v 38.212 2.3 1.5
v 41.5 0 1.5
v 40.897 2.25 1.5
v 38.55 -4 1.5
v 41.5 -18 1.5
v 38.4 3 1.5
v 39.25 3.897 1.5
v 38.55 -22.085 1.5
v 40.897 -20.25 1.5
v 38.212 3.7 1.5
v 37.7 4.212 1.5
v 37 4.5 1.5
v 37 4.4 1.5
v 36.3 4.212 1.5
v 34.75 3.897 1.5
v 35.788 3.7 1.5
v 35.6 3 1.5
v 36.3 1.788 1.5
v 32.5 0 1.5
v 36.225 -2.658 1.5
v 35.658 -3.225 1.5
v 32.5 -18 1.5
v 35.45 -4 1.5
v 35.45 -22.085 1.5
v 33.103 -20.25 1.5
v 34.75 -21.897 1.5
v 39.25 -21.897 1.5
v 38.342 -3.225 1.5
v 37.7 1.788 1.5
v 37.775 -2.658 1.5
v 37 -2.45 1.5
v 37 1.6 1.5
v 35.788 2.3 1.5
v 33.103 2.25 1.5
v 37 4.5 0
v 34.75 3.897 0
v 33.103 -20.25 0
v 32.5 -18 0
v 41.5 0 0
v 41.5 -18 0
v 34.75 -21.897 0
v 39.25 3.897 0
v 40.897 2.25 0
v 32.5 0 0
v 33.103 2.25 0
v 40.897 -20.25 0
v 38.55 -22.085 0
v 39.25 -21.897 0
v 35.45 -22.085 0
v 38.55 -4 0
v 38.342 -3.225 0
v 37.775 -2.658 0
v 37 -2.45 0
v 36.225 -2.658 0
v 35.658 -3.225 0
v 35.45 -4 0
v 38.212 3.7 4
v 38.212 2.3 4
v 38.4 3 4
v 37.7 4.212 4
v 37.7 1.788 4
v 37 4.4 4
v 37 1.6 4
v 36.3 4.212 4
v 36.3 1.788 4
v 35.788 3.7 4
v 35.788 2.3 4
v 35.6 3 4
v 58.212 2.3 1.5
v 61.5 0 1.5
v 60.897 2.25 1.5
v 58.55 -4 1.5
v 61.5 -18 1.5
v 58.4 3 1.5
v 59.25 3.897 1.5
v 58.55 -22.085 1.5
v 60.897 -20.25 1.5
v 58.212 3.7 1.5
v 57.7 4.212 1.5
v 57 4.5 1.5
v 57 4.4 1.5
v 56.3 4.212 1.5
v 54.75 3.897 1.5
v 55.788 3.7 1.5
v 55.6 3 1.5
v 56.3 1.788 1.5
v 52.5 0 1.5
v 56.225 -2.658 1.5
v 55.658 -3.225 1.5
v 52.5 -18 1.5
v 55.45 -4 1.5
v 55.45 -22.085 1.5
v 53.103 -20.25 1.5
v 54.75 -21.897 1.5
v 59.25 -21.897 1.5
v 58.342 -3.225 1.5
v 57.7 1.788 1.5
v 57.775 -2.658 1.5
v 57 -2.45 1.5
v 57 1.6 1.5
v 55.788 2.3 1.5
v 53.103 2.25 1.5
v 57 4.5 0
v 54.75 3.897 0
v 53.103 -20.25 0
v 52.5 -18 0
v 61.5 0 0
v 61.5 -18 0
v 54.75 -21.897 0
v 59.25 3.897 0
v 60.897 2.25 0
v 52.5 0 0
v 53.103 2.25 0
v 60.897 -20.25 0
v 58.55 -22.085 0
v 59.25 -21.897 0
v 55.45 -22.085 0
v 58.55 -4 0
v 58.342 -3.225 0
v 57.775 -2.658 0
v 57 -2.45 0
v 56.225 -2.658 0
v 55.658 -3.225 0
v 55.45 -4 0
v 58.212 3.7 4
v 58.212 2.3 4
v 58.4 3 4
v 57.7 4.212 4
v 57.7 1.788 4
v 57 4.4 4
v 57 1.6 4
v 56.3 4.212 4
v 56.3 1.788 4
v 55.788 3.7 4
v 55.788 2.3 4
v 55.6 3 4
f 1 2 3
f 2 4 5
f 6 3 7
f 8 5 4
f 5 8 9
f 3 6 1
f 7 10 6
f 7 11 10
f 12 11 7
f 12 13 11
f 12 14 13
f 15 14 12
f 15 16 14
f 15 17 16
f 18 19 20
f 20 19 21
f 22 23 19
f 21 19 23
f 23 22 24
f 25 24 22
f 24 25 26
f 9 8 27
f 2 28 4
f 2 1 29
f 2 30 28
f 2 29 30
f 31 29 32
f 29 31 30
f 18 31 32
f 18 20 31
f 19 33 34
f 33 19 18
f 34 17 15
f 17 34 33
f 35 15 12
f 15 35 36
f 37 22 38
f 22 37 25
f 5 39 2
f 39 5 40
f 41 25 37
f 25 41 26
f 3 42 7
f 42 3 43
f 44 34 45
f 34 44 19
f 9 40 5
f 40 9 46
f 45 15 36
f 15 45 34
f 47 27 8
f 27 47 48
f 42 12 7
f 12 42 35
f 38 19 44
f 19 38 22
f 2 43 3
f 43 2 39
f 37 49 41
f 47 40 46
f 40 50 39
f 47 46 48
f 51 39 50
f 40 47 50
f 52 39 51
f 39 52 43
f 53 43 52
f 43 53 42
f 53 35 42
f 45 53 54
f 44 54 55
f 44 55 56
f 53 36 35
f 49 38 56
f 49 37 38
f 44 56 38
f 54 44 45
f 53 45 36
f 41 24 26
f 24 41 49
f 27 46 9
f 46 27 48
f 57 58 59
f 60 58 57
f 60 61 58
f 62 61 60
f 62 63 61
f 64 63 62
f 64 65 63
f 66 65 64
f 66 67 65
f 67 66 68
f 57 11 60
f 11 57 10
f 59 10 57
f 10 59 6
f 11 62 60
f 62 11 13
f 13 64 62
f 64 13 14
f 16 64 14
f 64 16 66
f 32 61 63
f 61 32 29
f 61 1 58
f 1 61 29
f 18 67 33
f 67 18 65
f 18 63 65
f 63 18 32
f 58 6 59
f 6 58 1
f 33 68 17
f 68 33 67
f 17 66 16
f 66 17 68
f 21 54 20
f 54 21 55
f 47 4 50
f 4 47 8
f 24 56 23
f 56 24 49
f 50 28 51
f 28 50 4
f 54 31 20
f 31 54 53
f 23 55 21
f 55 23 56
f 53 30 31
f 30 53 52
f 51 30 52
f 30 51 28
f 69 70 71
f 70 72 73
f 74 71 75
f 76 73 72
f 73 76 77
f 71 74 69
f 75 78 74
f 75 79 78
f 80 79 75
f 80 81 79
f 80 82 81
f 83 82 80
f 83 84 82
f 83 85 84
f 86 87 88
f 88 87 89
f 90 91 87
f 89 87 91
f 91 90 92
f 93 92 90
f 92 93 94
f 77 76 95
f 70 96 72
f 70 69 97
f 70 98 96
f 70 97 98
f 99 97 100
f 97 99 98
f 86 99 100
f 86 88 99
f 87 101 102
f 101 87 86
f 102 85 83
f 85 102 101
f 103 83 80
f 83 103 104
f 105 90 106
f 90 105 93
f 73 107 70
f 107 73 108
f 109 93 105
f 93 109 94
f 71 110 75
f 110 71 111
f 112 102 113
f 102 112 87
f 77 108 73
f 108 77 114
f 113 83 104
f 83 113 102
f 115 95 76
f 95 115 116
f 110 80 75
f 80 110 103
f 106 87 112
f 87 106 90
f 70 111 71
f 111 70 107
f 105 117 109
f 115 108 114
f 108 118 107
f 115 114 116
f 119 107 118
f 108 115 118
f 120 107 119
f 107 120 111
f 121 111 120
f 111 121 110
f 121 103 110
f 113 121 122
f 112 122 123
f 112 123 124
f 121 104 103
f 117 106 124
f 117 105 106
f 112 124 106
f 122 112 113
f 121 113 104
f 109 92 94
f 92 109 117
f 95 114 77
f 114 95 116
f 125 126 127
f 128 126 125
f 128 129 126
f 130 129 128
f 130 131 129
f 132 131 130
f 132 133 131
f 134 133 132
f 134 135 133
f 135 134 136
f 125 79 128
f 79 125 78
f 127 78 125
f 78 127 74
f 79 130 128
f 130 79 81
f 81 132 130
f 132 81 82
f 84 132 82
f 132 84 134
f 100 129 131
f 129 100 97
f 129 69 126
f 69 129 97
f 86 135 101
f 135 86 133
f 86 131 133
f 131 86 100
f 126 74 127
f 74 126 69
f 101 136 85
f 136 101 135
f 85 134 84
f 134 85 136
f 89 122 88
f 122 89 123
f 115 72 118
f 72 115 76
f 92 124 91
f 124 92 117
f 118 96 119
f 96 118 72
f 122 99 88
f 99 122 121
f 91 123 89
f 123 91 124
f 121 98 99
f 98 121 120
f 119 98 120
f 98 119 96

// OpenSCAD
//do=42;
//
//module feet(beamZPos){
//    color("Aqua")
//    difference(){
//        union(){
//            translate([do/2-2.5,-do/2-6,0])
//                cube([2.5,30,15]);
//            translate([do/2-5,-do/2-6,beamZPos])
//                cube([5,30,2]);
//            translate([do/2-2,-do/2+8,7])
//                rotate([0,90,0])
//                    cylinder(d=3, h=6,$fn=18); 
//        }
//        
//translate([do/2-3,-do/2-1,7])
//    rotate([0,90,0])
//        cylinder(d=6.5, h=1.5, $fn=6);
//
//translate([10,-do/2-1,7])
//    rotate([0,90,0])
//        cylinder(d=3.5, h=20,$fn=18); 
//    }
//}
//
//
//
//module scaffold(){
//    color("Indigo")
//    difference(){
//    union(){
//        translate([0,0,0])
//            cube([45,17,2]);
//        cube([2.5,17,45]);
//        cube([4,17,4]);
//        
//        cube([45,2,30]);
//    }
//    translate([-1,8.5,6.5])
//        cube([15,3.5,42]);
//    translate([30,8.5,-1])
//        cylinder(d=8.5,h=10,$fn=18);
//    translate([8,-5,8])
//        cube([100,100,100]);
//}
//}
//
//color("Red")
//difference(){
//    union(){
//            cylinder(d=do,h=105);
//        translate([-1,-do/2-11,50])
//            cube([2,12,70]);
//        mirror([1,0,0])
//        feet(0);
//    }
//    translate([0,0,1.5])
//        cylinder(d=do-3,h=152);
//    
//    translate([-25,10,-1])
//        cube([50,50,152]);
//    translate([0,0,125.1])
//        cube([50,do+1,40],true);
//    
//    for (zShift=[110,120])
//    {
//    translate([-10,-do/2-6,zShift])
//        rotate([0,90,0])
//            cylinder(d=4,h=20,$fn=15);
//    }
//    for(zShit=[20,28,36])
//        for(xShit=[-8,0,8])
//            translate([xShit,0,zShit])
//                rotate([90,0,0])
//                    cylinder(d=4,h=60,$fn=15);
//    translate([-25,-72.6,41])
//        rotate([10,0,0])   
//            cube([50,50,70]);
////    
//}
//
//rotate([180,0,0])
//translate([100,0,-25])
//union(){
//    difference(){
//        union(){
//            cylinder(d=do+1,h=25);
//            translate([1,-do/2-11])
//                cube([2,12,25]);
//            translate([0,0,10])
//                feet(13);
//        }
//        translate([0,0,-1])
//            cylinder(d=do-3,h=27);
//        for (zShift=[5,15])
//        {
//            translate([-10,-do/2-6,zShift])
//                rotate([0,90,0])
//                    cylinder(d=4,h=20,$fn=15);
//        }
//                
//        translate([-25,2,-1])
//            cube([50,50,27]);
//    
//        
//
//    }
//    
//    difference(){    
//        union(){
//            for (yy=[-do/2-1,do/2-4]){
//                translate([yy,-5,10])
//                    cube([4,7,15]);
//            }
//            
//            translate([-do/2-1,2,10])    
//                    cube([12,3,15]); 
//            //TODO:HERE
//            translate([do/2-4,0.5,10])    
//                    cube([13,3,15]); 
//            
//            translate([do/2,1,17.5])    
//                rotate([-90,0,0])
//                    cylinder(d=3,h=6,$fn=15);
//        }
//        for (yy=[[-do/2+7,-6.5],[do/2+5,-8]]){
//            translate([yy[0],-3,17.5])
//                rotate([-90,0,0])
//                    cylinder(d=3.2,h=10, $fn=15);
//            translate([yy[0],yy[1],17.5])
//                rotate([-90,0,0])
//                    cylinder(d=6.5,h=10,$fn=6);
//        }
//            
//    }
//}
//
//
//
//
//for (trans=[0,80])
//    translate([trans,50,0])
//        scaffold();



module headTransFix(){
    difference(){
        union(){
            hull(){
                cylinder(d=9,h=1.5,$fn=12);
                translate([0,-18,0])
                    cylinder(d=9,h=1.5,$fn=12);
            }
            translate([0,3,0])
                cylinder(d=2.8,h=4,$fn=12);
        }
        hull(){
            for(yy5=[-35,-4])
                translate([0,yy5,-1])
                    cylinder(d=3.1,h=5,$fn=12);
            
        }
    }
}

for (xShift=[37,57]){
    translate([xShift,0,0])
    headTransFix();
}
